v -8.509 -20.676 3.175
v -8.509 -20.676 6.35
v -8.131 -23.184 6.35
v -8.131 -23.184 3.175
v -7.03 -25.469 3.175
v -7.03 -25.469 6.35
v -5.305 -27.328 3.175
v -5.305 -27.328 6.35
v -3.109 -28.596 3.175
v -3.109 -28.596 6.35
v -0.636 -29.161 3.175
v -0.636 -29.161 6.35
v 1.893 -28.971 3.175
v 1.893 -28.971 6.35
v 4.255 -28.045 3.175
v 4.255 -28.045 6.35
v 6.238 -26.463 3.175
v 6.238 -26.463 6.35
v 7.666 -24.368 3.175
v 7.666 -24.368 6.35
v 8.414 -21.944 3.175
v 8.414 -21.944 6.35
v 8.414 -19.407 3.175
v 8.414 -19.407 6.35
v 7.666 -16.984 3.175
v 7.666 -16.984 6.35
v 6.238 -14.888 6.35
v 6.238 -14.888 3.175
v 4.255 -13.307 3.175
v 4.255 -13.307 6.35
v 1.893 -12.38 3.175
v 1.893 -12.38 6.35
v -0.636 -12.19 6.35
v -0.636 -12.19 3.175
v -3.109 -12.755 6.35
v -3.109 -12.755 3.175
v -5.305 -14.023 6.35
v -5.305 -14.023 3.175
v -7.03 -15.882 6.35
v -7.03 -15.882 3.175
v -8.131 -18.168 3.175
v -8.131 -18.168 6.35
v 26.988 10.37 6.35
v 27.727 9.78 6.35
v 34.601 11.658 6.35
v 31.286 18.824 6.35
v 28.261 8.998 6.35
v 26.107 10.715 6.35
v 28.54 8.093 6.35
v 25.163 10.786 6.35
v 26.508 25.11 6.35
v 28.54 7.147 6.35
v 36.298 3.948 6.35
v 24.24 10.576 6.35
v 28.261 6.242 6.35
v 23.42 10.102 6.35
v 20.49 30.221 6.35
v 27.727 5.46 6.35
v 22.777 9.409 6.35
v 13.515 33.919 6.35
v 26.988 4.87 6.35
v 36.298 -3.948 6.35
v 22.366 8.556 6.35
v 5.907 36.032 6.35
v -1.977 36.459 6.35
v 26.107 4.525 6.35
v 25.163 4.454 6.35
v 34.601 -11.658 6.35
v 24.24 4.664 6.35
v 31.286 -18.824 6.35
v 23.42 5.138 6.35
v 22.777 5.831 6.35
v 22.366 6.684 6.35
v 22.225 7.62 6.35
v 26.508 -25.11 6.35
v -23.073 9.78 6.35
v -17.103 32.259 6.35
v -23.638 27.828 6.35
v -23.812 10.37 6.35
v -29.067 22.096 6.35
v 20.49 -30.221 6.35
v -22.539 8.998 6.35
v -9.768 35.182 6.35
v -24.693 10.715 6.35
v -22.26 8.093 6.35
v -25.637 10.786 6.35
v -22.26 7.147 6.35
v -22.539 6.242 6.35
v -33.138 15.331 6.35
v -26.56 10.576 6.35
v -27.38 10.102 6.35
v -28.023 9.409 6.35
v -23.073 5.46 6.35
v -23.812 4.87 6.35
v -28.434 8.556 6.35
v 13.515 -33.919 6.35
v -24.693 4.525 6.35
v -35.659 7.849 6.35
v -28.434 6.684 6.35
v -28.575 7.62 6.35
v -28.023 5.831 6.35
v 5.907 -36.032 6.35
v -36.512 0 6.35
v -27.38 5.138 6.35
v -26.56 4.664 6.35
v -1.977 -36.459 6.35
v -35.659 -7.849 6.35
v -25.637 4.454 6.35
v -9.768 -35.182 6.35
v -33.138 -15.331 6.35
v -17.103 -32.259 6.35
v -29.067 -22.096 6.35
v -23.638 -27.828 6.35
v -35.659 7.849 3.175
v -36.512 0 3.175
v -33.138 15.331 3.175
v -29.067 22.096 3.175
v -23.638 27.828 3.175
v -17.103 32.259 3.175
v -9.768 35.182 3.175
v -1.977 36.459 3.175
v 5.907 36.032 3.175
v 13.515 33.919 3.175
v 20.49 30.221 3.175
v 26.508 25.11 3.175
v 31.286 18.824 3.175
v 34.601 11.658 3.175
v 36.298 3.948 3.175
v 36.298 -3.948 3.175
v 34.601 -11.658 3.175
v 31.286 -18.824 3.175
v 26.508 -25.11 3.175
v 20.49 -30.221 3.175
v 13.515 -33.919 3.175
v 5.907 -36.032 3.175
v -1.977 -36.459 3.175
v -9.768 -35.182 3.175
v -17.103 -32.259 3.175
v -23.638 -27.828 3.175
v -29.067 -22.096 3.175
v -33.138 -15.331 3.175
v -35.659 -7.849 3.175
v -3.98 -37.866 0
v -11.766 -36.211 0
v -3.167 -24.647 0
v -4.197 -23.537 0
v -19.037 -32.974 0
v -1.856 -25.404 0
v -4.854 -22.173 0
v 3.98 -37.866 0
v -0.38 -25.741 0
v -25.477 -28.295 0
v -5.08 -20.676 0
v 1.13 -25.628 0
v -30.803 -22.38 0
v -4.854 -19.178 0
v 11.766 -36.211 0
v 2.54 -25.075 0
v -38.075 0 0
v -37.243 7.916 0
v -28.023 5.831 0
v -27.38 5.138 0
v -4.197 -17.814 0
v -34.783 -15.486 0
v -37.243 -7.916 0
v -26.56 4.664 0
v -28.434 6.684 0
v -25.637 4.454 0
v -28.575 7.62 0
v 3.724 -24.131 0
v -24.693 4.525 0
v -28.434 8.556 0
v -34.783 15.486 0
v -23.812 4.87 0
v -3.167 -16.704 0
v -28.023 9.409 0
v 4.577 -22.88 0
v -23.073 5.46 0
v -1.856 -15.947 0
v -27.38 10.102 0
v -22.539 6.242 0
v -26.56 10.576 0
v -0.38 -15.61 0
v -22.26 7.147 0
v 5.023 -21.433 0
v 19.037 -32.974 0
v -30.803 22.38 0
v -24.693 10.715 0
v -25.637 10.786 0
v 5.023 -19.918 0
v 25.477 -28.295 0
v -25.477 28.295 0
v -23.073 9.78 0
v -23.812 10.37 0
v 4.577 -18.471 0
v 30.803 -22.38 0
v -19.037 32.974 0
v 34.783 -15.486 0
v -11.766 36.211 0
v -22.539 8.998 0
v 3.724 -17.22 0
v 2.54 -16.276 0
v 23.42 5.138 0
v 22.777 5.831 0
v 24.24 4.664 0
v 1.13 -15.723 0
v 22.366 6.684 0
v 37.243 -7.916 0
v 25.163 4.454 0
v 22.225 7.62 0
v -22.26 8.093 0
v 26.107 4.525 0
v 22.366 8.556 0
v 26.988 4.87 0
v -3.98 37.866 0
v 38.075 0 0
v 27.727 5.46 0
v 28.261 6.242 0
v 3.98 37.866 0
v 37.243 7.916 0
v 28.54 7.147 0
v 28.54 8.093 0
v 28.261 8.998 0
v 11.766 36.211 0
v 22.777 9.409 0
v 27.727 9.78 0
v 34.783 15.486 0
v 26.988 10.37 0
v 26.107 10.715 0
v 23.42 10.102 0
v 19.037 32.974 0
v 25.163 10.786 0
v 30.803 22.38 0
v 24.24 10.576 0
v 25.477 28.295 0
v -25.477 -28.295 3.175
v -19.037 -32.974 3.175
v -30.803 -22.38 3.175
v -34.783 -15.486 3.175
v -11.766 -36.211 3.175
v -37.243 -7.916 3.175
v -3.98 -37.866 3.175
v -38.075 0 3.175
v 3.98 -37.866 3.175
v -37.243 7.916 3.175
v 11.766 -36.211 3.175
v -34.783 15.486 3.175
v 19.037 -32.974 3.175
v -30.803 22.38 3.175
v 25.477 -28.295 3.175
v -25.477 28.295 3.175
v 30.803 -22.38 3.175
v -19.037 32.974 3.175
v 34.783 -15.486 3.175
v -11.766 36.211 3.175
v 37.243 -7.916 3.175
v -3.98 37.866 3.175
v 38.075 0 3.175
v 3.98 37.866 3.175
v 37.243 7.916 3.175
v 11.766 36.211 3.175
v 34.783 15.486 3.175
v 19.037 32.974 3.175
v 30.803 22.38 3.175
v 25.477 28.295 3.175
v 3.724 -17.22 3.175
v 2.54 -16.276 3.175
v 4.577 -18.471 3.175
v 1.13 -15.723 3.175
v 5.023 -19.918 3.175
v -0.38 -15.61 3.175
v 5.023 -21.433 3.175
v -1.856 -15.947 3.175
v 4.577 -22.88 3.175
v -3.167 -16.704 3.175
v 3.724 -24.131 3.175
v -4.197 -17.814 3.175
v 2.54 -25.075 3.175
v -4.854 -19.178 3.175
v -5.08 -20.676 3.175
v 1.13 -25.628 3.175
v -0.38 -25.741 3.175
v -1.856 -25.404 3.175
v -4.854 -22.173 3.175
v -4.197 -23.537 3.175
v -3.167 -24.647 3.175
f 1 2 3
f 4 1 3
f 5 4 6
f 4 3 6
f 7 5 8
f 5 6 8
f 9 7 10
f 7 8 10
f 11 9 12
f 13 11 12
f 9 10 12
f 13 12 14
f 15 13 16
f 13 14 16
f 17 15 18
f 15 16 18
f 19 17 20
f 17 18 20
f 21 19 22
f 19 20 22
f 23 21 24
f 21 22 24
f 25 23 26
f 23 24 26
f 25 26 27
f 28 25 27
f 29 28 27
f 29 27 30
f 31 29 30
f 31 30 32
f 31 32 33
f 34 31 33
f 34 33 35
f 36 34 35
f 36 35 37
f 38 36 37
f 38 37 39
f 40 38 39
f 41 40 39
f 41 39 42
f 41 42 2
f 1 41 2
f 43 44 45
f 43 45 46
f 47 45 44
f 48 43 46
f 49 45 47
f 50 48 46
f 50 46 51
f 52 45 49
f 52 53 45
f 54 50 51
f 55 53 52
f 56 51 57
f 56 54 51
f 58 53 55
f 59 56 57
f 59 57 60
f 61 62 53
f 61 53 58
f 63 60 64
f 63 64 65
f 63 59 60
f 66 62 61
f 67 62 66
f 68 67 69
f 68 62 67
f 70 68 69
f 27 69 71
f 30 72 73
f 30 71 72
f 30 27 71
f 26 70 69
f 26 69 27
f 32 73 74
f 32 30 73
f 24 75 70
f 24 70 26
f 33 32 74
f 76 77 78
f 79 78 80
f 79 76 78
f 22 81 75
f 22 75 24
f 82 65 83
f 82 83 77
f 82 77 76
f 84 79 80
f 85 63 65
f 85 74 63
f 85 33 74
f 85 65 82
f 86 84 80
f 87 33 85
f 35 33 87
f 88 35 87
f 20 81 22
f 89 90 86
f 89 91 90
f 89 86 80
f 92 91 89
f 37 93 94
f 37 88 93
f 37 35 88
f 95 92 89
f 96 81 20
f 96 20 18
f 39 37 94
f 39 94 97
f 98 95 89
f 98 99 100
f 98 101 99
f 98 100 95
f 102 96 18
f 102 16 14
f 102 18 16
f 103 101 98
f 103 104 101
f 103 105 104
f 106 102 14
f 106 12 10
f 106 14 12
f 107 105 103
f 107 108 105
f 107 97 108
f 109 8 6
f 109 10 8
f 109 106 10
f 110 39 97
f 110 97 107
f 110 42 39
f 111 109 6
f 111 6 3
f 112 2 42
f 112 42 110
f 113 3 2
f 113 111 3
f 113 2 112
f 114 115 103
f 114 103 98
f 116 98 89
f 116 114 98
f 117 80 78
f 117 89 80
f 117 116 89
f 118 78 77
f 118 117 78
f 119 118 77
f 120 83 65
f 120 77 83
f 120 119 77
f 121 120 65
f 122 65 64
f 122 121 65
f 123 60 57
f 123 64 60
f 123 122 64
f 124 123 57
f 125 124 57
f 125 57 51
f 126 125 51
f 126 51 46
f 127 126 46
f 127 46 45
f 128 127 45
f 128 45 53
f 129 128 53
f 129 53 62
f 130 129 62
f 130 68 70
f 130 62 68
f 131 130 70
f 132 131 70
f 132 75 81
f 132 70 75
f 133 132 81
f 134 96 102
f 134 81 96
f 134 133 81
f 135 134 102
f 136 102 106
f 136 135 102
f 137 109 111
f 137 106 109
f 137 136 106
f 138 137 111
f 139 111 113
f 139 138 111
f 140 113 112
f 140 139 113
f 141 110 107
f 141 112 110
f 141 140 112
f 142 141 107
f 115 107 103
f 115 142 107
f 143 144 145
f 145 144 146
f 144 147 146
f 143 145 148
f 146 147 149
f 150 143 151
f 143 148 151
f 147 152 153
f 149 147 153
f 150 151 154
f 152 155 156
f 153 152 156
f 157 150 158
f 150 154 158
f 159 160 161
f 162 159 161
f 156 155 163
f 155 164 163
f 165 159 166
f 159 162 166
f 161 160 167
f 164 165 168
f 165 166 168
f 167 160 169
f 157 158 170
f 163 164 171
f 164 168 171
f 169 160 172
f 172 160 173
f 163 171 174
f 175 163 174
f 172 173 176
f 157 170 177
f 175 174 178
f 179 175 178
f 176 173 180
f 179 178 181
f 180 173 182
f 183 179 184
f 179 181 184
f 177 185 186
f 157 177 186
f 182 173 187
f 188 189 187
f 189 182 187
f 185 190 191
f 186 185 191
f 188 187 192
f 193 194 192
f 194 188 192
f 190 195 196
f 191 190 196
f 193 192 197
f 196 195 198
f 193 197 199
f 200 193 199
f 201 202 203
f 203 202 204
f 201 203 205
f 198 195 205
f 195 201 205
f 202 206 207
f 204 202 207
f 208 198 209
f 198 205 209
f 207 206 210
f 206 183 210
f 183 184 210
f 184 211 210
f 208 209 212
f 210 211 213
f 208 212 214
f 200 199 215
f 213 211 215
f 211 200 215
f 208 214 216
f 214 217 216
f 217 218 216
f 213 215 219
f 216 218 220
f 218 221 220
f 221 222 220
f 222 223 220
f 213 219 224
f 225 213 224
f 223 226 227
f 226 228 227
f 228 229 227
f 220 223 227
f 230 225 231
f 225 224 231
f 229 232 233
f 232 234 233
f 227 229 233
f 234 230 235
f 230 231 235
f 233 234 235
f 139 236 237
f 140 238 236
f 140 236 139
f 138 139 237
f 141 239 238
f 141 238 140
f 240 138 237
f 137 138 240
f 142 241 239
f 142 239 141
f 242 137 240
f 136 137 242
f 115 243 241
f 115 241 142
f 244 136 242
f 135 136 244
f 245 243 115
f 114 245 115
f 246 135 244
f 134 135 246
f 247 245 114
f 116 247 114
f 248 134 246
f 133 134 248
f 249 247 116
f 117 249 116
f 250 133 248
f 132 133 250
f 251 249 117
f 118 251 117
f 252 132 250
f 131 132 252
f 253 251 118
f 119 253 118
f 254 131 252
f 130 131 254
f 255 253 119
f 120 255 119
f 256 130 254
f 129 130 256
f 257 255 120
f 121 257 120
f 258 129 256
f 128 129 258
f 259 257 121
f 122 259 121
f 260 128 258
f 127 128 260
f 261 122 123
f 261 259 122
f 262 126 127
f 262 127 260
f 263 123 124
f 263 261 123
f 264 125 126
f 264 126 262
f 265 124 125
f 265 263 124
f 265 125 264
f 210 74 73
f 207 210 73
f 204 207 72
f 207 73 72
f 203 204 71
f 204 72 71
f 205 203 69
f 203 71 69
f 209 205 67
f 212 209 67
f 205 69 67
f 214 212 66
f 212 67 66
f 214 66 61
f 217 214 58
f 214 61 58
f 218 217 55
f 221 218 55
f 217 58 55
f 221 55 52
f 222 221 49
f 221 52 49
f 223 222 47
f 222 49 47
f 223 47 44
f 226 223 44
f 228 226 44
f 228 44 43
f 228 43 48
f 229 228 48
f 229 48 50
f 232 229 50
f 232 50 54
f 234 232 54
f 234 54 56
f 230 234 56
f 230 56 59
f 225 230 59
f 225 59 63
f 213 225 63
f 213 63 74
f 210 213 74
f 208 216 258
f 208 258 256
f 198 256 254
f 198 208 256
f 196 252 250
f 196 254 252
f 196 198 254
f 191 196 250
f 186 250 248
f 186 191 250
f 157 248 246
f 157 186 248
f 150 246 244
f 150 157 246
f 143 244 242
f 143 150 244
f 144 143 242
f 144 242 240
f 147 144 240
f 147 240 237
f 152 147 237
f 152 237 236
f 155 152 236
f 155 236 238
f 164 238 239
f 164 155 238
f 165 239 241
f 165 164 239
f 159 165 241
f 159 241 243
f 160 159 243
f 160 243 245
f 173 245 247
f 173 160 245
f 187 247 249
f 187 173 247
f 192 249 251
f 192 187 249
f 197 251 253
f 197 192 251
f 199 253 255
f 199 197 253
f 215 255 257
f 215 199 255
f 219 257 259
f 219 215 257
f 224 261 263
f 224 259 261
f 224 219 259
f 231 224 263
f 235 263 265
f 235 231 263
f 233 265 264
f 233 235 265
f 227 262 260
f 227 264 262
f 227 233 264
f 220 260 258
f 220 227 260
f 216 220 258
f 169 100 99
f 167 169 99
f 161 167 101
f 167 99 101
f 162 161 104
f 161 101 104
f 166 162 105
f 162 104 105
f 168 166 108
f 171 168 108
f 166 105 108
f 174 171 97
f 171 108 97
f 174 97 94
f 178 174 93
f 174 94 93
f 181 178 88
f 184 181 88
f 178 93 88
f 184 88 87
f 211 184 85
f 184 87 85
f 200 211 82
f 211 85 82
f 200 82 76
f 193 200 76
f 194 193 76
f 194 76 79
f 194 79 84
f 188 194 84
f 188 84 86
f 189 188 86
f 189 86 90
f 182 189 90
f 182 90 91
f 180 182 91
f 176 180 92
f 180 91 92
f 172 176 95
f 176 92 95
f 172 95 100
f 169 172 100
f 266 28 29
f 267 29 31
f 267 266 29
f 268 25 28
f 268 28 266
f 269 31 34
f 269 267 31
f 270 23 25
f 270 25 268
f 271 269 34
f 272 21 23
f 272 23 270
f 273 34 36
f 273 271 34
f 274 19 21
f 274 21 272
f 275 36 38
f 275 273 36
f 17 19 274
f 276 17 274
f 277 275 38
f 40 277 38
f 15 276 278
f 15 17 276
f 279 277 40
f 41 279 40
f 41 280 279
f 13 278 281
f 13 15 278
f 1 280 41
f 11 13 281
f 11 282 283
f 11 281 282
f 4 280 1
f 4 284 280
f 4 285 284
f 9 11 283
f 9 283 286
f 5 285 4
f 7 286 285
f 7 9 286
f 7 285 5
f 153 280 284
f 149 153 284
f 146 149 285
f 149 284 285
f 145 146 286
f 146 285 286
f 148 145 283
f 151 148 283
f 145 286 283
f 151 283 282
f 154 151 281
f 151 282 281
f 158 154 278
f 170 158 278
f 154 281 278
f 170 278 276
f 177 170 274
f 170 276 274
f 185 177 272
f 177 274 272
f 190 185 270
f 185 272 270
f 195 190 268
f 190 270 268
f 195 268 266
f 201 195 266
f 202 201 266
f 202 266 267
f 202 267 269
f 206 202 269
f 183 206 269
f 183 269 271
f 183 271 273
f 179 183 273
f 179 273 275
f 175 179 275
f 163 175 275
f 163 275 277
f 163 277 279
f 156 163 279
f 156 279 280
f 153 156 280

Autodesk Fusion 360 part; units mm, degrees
sketch "Sketch1" plane through (0, 0, 0) normal (0, 0, 1) x (1, 0, 0)
  circle A0 centre (0, 0) radius 38.0746
  dimension "d1" = 76.1492
extrude "Extrude1" add sketch "Sketch1" along normal blind 3.175
sketch "Sketch2" plane through (0, 0, 3.175) normal (0, 0, 1) x (-1, 0, 0)
  circle A0 centre (0, 0) radius 38.0746
  circle A1 centre (0, 0) radius 36.5125
  dimension "d4" = 73.025
extrude "Extrude2" add sketch "Sketch2" along normal blind 3.175 contours A1
sketch "Sketch3" plane through (0, 0, 6.35) normal (0, 0, 1) x (-1, 0, 0)
  circle A0 centre (0, 0) radius 36.5125
  circle A1 centre (25.4, -7.62) radius 3.175
  circle A2 centre (-25.4, -7.62) radius 3.175
  circle A3 centre (0, 20.6756) radius 5.08
  circle A4 centre (0, 0) radius 38.0746
  dimension "d7" = 50.8
  dimension "d8" = 25.4
  dimension "d9" = 7.62
  dimension "d10" = 6.35
  dimension "d11" = 6.35
  dimension "d12" = 10.16
  dimension "d13" = 20.6756
extrude "Extrude3" cut sketch "Sketch3" against normal blind 6.35 contours A1 | A2 | A3
sketch "Sketch4" plane through (0, 0, 6.35) normal (0, 0, 1) x (-1, 0, 0)
  circle A0 centre (-25.4, -7.62) radius 3.175
  circle A1 centre (0, 20.6756) radius 5.08
  circle A2 centre (25.4, -7.62) radius 3.175
  circle A3 centre (0, 0) radius 36.5125
  circle A4 centre (0, 20.6756) radius 8.509
  dimension "d16" = 17.018
extrude "Extrude4" cut sketch "Sketch4" against normal blind 3.175 contours A4
equation "d2 = ( 0.25 / 2 ) * 1 in"
equation "d5 = ( 0.25 / 2 ) * 1 in"
